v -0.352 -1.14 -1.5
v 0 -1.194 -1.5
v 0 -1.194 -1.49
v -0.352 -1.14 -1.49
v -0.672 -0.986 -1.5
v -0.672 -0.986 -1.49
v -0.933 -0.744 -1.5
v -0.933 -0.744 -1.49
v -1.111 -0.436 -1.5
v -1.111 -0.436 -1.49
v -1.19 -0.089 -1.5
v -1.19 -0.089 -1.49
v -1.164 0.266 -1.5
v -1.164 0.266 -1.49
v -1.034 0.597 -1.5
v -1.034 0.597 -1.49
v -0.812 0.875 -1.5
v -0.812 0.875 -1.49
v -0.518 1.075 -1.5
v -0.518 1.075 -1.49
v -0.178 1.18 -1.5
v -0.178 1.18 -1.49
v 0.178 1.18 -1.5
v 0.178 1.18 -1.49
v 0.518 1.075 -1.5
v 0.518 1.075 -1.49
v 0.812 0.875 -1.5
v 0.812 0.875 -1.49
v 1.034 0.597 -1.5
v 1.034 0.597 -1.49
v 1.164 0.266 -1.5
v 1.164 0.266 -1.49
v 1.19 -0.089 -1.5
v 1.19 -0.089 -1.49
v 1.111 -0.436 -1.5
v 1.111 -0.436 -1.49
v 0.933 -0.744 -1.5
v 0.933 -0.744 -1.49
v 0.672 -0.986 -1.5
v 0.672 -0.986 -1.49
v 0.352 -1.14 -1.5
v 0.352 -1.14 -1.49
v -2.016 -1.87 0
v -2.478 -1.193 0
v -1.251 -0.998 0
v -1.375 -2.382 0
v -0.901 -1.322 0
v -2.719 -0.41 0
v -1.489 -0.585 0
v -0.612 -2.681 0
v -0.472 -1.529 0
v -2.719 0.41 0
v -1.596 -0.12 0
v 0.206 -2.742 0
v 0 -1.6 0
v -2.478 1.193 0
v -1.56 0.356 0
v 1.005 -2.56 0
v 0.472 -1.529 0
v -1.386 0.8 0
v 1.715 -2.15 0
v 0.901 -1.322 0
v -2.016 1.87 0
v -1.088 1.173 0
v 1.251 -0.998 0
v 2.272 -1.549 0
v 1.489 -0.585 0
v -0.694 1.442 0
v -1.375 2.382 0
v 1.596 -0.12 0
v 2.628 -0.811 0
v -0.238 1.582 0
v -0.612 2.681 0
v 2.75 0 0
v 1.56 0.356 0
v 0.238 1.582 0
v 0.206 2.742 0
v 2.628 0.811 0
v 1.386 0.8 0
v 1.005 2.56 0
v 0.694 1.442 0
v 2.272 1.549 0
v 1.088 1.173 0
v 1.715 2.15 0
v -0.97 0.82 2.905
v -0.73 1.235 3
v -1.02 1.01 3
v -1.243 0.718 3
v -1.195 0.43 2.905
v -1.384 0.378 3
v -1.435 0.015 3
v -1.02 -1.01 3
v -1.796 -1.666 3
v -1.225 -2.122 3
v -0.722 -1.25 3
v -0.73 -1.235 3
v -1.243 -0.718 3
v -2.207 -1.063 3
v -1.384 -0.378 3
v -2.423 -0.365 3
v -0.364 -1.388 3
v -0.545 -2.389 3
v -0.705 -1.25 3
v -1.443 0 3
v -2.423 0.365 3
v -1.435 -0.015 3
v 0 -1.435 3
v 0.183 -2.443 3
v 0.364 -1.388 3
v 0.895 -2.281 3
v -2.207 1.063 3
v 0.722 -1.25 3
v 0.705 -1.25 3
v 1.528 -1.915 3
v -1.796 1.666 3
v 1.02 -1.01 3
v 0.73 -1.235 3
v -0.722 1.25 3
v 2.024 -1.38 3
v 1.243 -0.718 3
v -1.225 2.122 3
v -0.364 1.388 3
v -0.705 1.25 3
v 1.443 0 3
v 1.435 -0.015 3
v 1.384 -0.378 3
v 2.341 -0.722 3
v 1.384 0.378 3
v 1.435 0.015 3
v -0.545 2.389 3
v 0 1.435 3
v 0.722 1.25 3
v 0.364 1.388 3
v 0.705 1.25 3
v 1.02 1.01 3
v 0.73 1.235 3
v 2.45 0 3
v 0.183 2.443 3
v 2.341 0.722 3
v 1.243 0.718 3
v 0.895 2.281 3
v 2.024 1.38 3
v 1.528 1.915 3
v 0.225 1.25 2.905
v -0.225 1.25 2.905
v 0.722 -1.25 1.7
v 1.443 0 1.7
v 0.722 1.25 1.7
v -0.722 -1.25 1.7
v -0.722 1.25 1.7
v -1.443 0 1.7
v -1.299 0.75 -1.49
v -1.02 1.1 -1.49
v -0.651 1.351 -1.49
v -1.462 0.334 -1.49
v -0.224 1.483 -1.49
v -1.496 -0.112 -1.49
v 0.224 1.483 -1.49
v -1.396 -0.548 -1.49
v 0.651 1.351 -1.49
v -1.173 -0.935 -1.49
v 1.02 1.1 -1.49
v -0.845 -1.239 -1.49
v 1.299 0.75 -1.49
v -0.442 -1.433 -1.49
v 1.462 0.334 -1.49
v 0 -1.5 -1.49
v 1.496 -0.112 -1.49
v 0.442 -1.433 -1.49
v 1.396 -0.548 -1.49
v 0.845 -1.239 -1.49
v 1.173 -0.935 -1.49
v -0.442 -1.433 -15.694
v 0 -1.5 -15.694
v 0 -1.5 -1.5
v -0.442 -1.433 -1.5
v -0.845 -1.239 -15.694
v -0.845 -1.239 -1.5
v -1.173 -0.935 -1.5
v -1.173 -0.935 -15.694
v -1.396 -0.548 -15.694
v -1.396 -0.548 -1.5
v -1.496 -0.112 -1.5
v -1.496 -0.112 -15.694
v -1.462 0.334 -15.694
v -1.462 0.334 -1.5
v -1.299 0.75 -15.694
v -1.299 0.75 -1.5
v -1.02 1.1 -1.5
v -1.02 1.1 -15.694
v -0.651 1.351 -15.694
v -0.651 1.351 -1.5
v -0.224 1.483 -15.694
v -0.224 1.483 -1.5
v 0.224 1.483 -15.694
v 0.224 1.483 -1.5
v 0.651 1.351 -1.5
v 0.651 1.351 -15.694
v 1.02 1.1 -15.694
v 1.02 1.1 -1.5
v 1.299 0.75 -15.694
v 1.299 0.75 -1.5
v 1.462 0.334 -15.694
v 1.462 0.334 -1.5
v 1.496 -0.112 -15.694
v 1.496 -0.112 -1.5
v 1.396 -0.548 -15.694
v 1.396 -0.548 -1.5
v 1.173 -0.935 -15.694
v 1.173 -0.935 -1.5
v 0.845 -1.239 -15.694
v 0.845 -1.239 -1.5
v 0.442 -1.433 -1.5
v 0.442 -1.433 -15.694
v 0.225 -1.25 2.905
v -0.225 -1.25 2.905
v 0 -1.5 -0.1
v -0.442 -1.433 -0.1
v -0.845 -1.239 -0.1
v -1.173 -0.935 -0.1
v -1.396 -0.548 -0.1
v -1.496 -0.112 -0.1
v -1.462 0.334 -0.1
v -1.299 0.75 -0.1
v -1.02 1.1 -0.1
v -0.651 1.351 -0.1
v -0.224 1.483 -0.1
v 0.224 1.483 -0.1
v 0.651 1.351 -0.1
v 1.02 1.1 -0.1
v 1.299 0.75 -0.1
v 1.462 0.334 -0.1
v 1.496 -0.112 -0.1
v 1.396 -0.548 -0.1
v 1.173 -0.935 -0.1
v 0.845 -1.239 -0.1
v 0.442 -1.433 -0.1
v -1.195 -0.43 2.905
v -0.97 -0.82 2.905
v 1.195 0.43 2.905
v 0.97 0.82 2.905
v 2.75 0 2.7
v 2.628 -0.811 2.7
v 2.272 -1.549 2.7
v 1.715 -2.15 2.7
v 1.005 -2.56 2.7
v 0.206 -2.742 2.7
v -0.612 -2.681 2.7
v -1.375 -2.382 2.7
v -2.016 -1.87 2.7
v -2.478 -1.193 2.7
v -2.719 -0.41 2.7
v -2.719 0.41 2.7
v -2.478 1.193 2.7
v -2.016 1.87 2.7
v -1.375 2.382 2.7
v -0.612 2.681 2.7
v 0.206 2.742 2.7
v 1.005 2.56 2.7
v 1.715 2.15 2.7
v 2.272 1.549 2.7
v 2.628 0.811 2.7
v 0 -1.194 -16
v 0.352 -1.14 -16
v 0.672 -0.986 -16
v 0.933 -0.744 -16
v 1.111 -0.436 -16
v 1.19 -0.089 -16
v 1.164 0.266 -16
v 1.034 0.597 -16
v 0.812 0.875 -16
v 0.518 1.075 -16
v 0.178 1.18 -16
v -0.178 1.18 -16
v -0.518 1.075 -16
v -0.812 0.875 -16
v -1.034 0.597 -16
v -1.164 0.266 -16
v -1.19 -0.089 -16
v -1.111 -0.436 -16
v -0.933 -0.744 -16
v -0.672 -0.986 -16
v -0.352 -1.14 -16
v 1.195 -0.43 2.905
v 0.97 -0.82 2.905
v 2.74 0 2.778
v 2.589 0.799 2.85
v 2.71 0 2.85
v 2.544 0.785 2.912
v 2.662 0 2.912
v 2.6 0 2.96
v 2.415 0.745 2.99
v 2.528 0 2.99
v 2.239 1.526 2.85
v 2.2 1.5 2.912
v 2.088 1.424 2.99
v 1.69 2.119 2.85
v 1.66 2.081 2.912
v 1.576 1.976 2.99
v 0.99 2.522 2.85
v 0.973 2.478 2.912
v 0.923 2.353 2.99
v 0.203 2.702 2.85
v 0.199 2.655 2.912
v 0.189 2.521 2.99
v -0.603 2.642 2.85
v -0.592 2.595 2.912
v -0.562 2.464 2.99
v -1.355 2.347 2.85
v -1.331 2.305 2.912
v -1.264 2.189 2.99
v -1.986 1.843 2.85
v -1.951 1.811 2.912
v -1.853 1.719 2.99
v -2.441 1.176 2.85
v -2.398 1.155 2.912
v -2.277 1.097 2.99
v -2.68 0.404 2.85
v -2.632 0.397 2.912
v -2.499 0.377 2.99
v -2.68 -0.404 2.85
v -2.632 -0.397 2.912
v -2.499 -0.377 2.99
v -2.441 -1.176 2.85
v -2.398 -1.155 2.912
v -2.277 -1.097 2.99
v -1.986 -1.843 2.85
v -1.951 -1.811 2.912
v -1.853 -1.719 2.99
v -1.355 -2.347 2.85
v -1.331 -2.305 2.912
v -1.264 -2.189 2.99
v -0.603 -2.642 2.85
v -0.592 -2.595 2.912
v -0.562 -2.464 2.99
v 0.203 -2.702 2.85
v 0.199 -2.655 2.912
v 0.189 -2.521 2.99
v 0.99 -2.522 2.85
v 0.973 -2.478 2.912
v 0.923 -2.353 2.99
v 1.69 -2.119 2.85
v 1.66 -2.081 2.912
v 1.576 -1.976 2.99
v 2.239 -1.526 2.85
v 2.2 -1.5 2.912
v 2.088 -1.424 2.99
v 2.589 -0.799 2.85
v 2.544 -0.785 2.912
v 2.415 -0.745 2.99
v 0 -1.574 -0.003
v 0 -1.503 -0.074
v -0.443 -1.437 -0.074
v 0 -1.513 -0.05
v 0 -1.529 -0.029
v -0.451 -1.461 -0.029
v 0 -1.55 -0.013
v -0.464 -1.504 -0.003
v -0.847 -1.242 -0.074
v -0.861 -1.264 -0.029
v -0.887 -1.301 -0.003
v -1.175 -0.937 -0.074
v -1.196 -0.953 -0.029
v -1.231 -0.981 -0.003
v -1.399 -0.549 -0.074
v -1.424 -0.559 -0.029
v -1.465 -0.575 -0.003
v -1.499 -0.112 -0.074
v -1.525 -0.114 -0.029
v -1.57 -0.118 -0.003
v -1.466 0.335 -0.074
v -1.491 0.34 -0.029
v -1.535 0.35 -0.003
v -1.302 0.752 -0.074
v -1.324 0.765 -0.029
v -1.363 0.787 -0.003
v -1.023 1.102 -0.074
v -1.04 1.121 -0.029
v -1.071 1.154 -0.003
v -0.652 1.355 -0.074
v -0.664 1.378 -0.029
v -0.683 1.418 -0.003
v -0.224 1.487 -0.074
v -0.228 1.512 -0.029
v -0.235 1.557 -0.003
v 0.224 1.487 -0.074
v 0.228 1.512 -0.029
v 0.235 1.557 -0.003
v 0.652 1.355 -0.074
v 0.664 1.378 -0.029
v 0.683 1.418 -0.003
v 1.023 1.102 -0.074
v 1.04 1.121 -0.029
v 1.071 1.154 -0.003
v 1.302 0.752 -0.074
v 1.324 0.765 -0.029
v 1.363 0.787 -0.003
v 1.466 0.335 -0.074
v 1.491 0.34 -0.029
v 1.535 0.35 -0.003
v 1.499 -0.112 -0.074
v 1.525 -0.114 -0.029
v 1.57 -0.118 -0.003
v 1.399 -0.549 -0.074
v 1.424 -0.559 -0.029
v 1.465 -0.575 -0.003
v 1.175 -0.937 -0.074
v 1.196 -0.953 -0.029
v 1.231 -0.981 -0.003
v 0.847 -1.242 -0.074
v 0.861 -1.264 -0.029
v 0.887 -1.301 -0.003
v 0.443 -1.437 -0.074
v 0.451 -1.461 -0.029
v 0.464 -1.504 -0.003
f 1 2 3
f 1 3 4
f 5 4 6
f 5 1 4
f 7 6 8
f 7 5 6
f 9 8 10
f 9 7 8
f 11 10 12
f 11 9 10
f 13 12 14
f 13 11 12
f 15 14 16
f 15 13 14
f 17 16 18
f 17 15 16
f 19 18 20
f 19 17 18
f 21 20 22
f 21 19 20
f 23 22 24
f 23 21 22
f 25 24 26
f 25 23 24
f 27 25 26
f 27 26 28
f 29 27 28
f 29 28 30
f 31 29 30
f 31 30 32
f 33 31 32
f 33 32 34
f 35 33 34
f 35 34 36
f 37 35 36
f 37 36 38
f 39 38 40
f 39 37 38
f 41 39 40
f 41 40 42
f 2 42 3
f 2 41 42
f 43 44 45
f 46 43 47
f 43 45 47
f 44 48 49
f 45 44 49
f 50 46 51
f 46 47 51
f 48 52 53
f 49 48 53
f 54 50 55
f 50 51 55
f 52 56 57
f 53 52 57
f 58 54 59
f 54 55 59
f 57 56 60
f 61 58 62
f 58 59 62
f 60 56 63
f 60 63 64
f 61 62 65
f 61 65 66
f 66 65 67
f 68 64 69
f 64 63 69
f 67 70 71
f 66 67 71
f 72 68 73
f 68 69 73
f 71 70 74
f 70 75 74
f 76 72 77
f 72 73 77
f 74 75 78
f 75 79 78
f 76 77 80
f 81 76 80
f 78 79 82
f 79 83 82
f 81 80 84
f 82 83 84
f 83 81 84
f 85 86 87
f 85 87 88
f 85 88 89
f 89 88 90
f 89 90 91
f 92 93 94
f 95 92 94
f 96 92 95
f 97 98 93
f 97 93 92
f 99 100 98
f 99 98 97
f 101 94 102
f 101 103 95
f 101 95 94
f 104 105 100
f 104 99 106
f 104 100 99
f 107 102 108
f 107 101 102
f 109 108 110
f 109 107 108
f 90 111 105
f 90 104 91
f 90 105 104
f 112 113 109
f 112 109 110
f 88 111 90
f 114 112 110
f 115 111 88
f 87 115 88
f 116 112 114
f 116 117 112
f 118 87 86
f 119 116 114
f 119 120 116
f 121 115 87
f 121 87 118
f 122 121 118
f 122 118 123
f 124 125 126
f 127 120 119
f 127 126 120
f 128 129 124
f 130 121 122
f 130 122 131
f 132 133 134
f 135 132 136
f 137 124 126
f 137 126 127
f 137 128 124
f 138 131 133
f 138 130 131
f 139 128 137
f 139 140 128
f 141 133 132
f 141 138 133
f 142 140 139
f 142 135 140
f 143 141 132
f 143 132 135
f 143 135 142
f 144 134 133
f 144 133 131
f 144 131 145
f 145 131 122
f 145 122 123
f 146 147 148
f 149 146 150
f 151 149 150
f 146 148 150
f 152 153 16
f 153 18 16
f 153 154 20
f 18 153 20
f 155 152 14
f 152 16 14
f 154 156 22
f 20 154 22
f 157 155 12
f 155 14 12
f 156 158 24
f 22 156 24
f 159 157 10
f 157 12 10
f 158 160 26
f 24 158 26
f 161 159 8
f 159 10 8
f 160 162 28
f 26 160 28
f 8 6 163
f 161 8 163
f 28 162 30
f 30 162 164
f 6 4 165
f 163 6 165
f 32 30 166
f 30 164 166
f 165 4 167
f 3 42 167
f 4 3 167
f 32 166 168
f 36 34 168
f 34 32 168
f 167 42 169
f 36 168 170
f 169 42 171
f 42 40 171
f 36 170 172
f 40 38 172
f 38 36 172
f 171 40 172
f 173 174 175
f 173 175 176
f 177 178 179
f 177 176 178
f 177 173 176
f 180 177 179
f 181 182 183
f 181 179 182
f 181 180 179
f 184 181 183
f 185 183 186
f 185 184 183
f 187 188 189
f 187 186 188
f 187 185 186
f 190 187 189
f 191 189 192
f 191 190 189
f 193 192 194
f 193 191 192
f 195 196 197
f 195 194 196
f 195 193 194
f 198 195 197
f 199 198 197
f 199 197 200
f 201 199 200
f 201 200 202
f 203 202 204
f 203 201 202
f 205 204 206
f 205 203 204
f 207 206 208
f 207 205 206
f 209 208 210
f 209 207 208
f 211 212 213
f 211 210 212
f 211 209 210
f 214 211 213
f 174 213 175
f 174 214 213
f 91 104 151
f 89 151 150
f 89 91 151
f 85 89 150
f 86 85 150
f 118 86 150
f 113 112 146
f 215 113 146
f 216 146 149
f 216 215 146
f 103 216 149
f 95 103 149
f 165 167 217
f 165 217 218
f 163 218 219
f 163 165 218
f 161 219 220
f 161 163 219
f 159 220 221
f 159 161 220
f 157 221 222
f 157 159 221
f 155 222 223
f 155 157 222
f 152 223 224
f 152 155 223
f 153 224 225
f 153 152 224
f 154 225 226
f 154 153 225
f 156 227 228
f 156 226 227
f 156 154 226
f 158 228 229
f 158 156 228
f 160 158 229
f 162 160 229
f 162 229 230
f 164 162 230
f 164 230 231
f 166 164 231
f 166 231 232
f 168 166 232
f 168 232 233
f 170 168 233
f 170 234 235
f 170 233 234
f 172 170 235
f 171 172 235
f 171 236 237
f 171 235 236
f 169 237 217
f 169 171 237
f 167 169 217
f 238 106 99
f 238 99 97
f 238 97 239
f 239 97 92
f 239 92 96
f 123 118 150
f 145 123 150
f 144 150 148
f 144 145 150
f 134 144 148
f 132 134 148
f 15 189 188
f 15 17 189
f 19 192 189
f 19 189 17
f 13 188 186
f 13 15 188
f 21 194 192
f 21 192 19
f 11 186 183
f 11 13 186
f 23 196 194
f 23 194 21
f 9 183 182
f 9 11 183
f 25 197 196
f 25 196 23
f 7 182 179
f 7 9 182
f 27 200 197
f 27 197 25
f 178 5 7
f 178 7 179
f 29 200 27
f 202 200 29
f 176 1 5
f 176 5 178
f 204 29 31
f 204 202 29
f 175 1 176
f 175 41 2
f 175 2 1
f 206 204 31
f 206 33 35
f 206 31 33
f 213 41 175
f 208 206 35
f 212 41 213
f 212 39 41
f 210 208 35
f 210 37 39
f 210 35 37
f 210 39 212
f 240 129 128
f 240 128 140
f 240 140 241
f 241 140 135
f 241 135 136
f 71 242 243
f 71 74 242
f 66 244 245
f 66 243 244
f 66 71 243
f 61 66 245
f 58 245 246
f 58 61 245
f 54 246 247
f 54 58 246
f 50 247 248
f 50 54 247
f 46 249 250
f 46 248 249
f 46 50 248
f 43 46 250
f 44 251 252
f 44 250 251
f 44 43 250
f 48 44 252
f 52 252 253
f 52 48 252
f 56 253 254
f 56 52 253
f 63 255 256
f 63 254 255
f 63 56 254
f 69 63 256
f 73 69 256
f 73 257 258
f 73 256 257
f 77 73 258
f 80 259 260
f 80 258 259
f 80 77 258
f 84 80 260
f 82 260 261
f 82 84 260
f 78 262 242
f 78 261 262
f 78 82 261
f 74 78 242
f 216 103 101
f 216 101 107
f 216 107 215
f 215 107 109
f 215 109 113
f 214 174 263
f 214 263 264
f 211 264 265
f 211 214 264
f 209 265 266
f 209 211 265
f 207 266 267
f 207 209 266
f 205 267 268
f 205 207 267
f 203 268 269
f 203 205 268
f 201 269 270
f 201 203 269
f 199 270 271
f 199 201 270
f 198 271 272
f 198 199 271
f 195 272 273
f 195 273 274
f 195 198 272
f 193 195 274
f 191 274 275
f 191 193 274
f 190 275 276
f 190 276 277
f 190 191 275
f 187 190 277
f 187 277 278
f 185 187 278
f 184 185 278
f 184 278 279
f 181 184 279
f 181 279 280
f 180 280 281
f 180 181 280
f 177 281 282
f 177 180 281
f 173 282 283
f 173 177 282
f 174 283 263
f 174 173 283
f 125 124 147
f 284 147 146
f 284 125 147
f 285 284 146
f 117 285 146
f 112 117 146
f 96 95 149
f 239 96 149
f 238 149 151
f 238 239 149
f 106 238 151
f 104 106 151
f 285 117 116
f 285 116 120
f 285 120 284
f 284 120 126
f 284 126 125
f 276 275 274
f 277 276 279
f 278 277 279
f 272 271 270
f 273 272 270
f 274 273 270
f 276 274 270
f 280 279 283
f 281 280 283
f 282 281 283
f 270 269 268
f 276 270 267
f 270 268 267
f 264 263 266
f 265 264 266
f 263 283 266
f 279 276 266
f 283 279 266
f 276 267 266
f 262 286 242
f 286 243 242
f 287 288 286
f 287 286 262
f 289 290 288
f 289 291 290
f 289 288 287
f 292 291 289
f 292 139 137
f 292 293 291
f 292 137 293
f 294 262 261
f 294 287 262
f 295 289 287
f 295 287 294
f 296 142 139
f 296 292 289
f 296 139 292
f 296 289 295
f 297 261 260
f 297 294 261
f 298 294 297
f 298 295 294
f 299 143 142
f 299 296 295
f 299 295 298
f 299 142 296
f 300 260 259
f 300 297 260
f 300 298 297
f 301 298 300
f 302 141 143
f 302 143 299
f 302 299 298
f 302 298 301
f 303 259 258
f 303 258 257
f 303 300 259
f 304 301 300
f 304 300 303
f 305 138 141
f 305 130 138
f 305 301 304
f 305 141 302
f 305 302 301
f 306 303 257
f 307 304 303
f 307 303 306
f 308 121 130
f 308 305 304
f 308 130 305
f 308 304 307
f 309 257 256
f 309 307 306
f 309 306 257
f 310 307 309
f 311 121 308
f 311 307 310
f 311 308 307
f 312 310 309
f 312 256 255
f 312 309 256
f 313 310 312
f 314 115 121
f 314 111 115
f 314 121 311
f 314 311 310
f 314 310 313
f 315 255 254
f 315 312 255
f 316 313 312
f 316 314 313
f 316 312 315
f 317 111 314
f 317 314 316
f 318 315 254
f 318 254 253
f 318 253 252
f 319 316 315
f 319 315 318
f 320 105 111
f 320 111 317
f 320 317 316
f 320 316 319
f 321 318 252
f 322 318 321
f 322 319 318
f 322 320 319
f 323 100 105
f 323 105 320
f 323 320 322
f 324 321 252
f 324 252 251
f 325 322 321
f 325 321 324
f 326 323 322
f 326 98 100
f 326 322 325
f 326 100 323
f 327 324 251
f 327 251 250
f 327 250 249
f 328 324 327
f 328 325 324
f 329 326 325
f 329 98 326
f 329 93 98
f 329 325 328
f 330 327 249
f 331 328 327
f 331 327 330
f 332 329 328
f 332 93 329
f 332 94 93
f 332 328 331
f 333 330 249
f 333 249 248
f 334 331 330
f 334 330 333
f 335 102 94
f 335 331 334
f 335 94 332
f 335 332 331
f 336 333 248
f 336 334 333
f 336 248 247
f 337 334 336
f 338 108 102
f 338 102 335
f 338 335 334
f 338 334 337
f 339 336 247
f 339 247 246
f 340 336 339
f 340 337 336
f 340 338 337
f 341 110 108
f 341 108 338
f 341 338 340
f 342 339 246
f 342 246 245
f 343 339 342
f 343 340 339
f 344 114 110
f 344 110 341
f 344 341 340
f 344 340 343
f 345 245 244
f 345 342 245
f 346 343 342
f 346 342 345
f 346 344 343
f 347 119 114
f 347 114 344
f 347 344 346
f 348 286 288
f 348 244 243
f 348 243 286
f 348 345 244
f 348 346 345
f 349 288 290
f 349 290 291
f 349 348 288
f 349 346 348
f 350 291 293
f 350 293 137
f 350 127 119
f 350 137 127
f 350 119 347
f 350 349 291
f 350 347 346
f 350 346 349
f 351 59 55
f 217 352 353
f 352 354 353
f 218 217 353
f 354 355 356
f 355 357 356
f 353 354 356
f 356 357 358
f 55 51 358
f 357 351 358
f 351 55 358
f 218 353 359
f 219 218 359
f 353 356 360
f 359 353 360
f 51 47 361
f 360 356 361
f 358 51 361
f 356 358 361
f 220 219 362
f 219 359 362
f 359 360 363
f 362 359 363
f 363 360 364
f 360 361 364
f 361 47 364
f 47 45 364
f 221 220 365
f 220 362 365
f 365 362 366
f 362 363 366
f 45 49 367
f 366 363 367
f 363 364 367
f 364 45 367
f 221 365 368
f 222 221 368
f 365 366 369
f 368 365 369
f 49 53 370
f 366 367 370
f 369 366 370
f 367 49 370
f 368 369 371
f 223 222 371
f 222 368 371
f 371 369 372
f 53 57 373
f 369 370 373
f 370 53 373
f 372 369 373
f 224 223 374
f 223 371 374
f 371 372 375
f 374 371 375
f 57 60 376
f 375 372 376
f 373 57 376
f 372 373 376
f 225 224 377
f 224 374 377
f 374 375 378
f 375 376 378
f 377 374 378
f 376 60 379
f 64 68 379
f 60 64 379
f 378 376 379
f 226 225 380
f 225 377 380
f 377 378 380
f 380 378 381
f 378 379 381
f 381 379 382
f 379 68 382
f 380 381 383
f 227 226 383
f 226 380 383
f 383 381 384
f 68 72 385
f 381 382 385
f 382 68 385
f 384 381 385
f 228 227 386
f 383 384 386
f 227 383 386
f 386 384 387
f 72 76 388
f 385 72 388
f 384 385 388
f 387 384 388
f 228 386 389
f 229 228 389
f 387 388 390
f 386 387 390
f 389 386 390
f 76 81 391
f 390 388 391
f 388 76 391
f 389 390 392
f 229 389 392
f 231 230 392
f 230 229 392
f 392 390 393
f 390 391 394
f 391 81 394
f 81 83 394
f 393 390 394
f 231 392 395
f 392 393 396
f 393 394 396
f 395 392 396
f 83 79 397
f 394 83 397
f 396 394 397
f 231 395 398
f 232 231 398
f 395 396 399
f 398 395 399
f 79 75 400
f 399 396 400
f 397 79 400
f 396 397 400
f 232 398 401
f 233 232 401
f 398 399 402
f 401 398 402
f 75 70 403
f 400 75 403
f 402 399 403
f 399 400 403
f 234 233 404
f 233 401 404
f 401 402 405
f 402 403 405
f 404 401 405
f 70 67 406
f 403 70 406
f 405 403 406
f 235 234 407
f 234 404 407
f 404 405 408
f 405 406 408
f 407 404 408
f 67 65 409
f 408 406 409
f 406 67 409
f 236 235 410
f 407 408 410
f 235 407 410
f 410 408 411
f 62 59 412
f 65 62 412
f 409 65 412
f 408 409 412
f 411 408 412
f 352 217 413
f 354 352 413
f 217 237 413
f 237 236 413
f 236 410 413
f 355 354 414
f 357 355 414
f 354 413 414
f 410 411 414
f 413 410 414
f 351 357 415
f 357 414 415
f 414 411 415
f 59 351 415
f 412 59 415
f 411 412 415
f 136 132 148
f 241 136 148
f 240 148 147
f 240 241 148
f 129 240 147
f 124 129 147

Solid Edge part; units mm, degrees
sketch "Sketch1" plane through (0, 0, 0) normal (0, 0, 1) x (1, 0, 0)
  circle A0 centre (0, 0) radius 2.75
extrude "Protrusion1" add sketch "Sketch1" along normal blind 3
sketch "Sketch2" plane through (0, 0, 3) normal (0, 0, 1) x (0, 1, 0)
  line L0 (0, 1.4434) -> (1.25, 0.7217)
  line L1 (1.25, 0.7217) -> (1.25, -0.7217)
  line L2 (1.25, -0.7217) -> (0, -1.4434)
  line L3 (0, -1.4434) -> (-1.25, -0.7217)
  line L4 (-1.25, -0.7217) -> (-1.25, 0.7217)
  line L5 (-1.25, 0.7217) -> (0, 1.4434)
extrude "Cutout1" cut sketch "Sketch2" against normal blind 1.3
fillet "Round1" radius 0.3 1 edges at (-2.75, 0, 3)
sketch "Sketch3" plane through (0, 0, 0) normal (1, 0, 0) x (0, 1, 0)
  line L0 (-1.1935, -16) -> (0, -16)
  line L1 (-1.5, -15.6935) -> (-1.1935, -16)
  line L2 (-1.5, -1.5) -> (-1.5, -15.6935)
  line L3 (-1.1935, -1.5) -> (-1.5, -1.5)
  line L4 (-1.1935, -1.49) -> (-1.1935, -1.5)
  line L5 (-1.5, -1.49) -> (-1.1935, -1.49)
  line L6 (-1.5, -0.1) -> (-1.5, -1.49)
  arc A0 (-1.5, -0.1) -> (-1.6, 0) centre (-1.6, -0.1) ccw
  dimension "D1" = 1.5
  dimension "D2" = 0.01
  dimension "D3" = 0.1
  dimension "D4" = 16
revolve "RevolvedProtrusion1" add sketch "Sketch3" angle 360 about axis through (0, 0, -60.325) along (0, 0, 1) material side at (0, -0.5968, -15.95)
cosmetic_thread "Thread1" size "M3"
sketch "Sketch4" plane through (0, 0, 0) normal (0, -1, 0) x (1, 0, 0)
  line L0 (-1.435, 3) -> (0, 2.1715)
revolve "RevolvedCutout1" cut sketch "Sketch4" angle 360 about axis through (0, 0, 57.15) along (0, 0, -1) material side at (-0.6925, 0, 2.6291)
properties material "Stahl"
